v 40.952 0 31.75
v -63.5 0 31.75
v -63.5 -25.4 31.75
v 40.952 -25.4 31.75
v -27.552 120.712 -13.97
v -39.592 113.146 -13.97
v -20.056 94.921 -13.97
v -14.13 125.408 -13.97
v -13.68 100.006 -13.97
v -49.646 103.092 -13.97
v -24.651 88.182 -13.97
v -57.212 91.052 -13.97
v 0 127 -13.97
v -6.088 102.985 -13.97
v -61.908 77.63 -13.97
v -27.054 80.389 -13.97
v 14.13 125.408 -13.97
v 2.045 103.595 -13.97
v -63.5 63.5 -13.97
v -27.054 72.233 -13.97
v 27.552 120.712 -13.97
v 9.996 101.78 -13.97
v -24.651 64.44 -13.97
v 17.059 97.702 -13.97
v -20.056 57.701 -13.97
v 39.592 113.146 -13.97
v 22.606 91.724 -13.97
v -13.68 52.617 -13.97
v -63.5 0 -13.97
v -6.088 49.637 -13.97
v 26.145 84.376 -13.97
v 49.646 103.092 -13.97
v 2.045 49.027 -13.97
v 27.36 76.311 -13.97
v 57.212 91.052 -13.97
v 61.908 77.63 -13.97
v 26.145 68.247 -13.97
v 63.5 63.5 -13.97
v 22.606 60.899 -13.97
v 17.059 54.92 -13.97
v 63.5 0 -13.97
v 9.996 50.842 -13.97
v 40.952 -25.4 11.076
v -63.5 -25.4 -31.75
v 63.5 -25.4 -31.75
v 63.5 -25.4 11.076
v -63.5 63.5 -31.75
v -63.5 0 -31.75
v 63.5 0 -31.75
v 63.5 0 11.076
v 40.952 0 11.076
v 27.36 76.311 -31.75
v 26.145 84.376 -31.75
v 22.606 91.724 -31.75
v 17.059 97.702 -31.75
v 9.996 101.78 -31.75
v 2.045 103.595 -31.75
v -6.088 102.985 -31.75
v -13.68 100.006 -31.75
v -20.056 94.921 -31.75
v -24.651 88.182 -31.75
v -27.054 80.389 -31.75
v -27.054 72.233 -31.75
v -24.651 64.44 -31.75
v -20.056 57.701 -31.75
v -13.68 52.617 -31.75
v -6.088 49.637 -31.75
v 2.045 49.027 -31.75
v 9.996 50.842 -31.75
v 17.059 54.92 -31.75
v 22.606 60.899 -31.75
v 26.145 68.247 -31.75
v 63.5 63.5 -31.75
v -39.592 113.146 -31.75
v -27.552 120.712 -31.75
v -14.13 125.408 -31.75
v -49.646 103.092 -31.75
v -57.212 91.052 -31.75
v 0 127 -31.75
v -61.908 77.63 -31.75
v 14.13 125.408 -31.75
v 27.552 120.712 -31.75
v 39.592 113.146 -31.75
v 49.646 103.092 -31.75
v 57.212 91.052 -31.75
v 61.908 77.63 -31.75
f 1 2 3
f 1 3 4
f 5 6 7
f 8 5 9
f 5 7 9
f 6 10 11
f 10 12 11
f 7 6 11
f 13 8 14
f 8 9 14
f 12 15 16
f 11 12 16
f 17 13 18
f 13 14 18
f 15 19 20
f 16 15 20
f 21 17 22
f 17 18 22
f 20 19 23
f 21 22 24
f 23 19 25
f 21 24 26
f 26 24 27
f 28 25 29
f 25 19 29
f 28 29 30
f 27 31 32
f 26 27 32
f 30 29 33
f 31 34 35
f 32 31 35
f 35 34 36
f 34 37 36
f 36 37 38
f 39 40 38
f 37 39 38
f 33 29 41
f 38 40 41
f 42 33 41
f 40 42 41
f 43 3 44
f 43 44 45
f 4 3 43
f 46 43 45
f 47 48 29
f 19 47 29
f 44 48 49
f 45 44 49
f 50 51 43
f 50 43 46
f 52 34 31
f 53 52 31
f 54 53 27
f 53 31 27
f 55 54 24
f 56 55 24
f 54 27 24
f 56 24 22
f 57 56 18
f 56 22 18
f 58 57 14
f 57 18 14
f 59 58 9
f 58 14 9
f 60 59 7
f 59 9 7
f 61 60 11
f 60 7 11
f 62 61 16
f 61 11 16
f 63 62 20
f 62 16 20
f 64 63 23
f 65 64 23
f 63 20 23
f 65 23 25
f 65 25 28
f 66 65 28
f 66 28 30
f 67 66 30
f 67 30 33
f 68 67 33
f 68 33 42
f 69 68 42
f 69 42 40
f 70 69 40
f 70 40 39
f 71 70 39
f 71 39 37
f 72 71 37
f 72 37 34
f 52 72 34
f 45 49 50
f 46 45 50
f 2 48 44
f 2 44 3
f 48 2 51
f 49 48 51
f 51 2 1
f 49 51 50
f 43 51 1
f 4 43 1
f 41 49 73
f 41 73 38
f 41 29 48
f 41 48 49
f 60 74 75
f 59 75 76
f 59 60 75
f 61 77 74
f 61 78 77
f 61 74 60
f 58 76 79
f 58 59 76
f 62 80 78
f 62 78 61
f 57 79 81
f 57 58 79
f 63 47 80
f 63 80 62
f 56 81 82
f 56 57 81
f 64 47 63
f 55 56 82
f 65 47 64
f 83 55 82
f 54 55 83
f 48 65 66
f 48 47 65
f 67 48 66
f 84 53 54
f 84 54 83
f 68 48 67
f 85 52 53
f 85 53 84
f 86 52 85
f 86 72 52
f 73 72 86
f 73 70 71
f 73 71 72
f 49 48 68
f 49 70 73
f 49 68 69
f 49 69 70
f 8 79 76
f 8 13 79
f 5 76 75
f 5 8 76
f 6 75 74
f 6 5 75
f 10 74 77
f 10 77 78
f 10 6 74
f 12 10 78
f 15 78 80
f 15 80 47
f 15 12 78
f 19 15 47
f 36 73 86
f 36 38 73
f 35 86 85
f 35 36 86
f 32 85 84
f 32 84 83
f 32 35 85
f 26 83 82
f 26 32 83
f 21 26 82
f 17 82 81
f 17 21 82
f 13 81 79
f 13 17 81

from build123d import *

# Parameters (mm, degrees)
F0_W     = 127
F0_H     = 63.5
F1_DEPTH = 25.4
F2_W     = 22.5477049351
F2_H     = 20.6739342883
F3_DEPTH = 25.4
F4_W     = 127
F4_H     = 17.7800003439
F5_DEPTH = 127
F6_R     = 63.5
F7_R     = 63.49999
F8_R     = 27.3600762243
F9_DEPTH = 25.4


# Not quite as in the source:
# - a fillet or chamfer is up to 0.001 mm smaller than in the source, because OpenCascade refuses the exact size


with BuildPart() as f1:
    # F0 (on Front) → F1 (new body)
    with BuildSketch(Plane.XZ):
        Rectangle(F0_W, F0_H)
    extrude(amount=F1_DEPTH)

    # F2 (on face) → F3 (cut)
    with BuildSketch(Plane.XZ.offset(25.4)):
        with Locations((52.2261475325, 21.4130328558)):
            Rectangle(F2_W, F2_H)
    extrude(amount=-F3_DEPTH, mode=Mode.SUBTRACT)


with BuildPart() as f5:
    # F4 (on Front) → F5 (new body)
    with BuildSketch(Plane.XZ):
        with Locations((0, -22.859999828)):
            Rectangle(F4_W, F4_H)
    extrude(amount=-F5_DEPTH)

    # F6
    f6_edges = [f5.edges().sort_by_distance(p)[0] for p in [
        (63.5, 127, -22.86),
    ]]
    fillet(f6_edges, radius=F6_R)

    # F7 (radius 63.5 in the source; OpenCascade refuses exactly that, so slightly less here)
    f7_edges = [f5.edges().sort_by_distance(p)[0] for p in [
        (-63.5, 127, -22.86),
    ]]
    fillet(f7_edges, radius=F7_R)

    # F8 (on face) → F9 (cut)
    with BuildSketch(Plane.XY.offset(-13.9699996561)):
        with Locations((0, 76.3110369444)):
            Circle(F8_R)
    extrude(amount=-F9_DEPTH, mode=Mode.SUBTRACT)


solid = Compound([f1.part, f5.part])
